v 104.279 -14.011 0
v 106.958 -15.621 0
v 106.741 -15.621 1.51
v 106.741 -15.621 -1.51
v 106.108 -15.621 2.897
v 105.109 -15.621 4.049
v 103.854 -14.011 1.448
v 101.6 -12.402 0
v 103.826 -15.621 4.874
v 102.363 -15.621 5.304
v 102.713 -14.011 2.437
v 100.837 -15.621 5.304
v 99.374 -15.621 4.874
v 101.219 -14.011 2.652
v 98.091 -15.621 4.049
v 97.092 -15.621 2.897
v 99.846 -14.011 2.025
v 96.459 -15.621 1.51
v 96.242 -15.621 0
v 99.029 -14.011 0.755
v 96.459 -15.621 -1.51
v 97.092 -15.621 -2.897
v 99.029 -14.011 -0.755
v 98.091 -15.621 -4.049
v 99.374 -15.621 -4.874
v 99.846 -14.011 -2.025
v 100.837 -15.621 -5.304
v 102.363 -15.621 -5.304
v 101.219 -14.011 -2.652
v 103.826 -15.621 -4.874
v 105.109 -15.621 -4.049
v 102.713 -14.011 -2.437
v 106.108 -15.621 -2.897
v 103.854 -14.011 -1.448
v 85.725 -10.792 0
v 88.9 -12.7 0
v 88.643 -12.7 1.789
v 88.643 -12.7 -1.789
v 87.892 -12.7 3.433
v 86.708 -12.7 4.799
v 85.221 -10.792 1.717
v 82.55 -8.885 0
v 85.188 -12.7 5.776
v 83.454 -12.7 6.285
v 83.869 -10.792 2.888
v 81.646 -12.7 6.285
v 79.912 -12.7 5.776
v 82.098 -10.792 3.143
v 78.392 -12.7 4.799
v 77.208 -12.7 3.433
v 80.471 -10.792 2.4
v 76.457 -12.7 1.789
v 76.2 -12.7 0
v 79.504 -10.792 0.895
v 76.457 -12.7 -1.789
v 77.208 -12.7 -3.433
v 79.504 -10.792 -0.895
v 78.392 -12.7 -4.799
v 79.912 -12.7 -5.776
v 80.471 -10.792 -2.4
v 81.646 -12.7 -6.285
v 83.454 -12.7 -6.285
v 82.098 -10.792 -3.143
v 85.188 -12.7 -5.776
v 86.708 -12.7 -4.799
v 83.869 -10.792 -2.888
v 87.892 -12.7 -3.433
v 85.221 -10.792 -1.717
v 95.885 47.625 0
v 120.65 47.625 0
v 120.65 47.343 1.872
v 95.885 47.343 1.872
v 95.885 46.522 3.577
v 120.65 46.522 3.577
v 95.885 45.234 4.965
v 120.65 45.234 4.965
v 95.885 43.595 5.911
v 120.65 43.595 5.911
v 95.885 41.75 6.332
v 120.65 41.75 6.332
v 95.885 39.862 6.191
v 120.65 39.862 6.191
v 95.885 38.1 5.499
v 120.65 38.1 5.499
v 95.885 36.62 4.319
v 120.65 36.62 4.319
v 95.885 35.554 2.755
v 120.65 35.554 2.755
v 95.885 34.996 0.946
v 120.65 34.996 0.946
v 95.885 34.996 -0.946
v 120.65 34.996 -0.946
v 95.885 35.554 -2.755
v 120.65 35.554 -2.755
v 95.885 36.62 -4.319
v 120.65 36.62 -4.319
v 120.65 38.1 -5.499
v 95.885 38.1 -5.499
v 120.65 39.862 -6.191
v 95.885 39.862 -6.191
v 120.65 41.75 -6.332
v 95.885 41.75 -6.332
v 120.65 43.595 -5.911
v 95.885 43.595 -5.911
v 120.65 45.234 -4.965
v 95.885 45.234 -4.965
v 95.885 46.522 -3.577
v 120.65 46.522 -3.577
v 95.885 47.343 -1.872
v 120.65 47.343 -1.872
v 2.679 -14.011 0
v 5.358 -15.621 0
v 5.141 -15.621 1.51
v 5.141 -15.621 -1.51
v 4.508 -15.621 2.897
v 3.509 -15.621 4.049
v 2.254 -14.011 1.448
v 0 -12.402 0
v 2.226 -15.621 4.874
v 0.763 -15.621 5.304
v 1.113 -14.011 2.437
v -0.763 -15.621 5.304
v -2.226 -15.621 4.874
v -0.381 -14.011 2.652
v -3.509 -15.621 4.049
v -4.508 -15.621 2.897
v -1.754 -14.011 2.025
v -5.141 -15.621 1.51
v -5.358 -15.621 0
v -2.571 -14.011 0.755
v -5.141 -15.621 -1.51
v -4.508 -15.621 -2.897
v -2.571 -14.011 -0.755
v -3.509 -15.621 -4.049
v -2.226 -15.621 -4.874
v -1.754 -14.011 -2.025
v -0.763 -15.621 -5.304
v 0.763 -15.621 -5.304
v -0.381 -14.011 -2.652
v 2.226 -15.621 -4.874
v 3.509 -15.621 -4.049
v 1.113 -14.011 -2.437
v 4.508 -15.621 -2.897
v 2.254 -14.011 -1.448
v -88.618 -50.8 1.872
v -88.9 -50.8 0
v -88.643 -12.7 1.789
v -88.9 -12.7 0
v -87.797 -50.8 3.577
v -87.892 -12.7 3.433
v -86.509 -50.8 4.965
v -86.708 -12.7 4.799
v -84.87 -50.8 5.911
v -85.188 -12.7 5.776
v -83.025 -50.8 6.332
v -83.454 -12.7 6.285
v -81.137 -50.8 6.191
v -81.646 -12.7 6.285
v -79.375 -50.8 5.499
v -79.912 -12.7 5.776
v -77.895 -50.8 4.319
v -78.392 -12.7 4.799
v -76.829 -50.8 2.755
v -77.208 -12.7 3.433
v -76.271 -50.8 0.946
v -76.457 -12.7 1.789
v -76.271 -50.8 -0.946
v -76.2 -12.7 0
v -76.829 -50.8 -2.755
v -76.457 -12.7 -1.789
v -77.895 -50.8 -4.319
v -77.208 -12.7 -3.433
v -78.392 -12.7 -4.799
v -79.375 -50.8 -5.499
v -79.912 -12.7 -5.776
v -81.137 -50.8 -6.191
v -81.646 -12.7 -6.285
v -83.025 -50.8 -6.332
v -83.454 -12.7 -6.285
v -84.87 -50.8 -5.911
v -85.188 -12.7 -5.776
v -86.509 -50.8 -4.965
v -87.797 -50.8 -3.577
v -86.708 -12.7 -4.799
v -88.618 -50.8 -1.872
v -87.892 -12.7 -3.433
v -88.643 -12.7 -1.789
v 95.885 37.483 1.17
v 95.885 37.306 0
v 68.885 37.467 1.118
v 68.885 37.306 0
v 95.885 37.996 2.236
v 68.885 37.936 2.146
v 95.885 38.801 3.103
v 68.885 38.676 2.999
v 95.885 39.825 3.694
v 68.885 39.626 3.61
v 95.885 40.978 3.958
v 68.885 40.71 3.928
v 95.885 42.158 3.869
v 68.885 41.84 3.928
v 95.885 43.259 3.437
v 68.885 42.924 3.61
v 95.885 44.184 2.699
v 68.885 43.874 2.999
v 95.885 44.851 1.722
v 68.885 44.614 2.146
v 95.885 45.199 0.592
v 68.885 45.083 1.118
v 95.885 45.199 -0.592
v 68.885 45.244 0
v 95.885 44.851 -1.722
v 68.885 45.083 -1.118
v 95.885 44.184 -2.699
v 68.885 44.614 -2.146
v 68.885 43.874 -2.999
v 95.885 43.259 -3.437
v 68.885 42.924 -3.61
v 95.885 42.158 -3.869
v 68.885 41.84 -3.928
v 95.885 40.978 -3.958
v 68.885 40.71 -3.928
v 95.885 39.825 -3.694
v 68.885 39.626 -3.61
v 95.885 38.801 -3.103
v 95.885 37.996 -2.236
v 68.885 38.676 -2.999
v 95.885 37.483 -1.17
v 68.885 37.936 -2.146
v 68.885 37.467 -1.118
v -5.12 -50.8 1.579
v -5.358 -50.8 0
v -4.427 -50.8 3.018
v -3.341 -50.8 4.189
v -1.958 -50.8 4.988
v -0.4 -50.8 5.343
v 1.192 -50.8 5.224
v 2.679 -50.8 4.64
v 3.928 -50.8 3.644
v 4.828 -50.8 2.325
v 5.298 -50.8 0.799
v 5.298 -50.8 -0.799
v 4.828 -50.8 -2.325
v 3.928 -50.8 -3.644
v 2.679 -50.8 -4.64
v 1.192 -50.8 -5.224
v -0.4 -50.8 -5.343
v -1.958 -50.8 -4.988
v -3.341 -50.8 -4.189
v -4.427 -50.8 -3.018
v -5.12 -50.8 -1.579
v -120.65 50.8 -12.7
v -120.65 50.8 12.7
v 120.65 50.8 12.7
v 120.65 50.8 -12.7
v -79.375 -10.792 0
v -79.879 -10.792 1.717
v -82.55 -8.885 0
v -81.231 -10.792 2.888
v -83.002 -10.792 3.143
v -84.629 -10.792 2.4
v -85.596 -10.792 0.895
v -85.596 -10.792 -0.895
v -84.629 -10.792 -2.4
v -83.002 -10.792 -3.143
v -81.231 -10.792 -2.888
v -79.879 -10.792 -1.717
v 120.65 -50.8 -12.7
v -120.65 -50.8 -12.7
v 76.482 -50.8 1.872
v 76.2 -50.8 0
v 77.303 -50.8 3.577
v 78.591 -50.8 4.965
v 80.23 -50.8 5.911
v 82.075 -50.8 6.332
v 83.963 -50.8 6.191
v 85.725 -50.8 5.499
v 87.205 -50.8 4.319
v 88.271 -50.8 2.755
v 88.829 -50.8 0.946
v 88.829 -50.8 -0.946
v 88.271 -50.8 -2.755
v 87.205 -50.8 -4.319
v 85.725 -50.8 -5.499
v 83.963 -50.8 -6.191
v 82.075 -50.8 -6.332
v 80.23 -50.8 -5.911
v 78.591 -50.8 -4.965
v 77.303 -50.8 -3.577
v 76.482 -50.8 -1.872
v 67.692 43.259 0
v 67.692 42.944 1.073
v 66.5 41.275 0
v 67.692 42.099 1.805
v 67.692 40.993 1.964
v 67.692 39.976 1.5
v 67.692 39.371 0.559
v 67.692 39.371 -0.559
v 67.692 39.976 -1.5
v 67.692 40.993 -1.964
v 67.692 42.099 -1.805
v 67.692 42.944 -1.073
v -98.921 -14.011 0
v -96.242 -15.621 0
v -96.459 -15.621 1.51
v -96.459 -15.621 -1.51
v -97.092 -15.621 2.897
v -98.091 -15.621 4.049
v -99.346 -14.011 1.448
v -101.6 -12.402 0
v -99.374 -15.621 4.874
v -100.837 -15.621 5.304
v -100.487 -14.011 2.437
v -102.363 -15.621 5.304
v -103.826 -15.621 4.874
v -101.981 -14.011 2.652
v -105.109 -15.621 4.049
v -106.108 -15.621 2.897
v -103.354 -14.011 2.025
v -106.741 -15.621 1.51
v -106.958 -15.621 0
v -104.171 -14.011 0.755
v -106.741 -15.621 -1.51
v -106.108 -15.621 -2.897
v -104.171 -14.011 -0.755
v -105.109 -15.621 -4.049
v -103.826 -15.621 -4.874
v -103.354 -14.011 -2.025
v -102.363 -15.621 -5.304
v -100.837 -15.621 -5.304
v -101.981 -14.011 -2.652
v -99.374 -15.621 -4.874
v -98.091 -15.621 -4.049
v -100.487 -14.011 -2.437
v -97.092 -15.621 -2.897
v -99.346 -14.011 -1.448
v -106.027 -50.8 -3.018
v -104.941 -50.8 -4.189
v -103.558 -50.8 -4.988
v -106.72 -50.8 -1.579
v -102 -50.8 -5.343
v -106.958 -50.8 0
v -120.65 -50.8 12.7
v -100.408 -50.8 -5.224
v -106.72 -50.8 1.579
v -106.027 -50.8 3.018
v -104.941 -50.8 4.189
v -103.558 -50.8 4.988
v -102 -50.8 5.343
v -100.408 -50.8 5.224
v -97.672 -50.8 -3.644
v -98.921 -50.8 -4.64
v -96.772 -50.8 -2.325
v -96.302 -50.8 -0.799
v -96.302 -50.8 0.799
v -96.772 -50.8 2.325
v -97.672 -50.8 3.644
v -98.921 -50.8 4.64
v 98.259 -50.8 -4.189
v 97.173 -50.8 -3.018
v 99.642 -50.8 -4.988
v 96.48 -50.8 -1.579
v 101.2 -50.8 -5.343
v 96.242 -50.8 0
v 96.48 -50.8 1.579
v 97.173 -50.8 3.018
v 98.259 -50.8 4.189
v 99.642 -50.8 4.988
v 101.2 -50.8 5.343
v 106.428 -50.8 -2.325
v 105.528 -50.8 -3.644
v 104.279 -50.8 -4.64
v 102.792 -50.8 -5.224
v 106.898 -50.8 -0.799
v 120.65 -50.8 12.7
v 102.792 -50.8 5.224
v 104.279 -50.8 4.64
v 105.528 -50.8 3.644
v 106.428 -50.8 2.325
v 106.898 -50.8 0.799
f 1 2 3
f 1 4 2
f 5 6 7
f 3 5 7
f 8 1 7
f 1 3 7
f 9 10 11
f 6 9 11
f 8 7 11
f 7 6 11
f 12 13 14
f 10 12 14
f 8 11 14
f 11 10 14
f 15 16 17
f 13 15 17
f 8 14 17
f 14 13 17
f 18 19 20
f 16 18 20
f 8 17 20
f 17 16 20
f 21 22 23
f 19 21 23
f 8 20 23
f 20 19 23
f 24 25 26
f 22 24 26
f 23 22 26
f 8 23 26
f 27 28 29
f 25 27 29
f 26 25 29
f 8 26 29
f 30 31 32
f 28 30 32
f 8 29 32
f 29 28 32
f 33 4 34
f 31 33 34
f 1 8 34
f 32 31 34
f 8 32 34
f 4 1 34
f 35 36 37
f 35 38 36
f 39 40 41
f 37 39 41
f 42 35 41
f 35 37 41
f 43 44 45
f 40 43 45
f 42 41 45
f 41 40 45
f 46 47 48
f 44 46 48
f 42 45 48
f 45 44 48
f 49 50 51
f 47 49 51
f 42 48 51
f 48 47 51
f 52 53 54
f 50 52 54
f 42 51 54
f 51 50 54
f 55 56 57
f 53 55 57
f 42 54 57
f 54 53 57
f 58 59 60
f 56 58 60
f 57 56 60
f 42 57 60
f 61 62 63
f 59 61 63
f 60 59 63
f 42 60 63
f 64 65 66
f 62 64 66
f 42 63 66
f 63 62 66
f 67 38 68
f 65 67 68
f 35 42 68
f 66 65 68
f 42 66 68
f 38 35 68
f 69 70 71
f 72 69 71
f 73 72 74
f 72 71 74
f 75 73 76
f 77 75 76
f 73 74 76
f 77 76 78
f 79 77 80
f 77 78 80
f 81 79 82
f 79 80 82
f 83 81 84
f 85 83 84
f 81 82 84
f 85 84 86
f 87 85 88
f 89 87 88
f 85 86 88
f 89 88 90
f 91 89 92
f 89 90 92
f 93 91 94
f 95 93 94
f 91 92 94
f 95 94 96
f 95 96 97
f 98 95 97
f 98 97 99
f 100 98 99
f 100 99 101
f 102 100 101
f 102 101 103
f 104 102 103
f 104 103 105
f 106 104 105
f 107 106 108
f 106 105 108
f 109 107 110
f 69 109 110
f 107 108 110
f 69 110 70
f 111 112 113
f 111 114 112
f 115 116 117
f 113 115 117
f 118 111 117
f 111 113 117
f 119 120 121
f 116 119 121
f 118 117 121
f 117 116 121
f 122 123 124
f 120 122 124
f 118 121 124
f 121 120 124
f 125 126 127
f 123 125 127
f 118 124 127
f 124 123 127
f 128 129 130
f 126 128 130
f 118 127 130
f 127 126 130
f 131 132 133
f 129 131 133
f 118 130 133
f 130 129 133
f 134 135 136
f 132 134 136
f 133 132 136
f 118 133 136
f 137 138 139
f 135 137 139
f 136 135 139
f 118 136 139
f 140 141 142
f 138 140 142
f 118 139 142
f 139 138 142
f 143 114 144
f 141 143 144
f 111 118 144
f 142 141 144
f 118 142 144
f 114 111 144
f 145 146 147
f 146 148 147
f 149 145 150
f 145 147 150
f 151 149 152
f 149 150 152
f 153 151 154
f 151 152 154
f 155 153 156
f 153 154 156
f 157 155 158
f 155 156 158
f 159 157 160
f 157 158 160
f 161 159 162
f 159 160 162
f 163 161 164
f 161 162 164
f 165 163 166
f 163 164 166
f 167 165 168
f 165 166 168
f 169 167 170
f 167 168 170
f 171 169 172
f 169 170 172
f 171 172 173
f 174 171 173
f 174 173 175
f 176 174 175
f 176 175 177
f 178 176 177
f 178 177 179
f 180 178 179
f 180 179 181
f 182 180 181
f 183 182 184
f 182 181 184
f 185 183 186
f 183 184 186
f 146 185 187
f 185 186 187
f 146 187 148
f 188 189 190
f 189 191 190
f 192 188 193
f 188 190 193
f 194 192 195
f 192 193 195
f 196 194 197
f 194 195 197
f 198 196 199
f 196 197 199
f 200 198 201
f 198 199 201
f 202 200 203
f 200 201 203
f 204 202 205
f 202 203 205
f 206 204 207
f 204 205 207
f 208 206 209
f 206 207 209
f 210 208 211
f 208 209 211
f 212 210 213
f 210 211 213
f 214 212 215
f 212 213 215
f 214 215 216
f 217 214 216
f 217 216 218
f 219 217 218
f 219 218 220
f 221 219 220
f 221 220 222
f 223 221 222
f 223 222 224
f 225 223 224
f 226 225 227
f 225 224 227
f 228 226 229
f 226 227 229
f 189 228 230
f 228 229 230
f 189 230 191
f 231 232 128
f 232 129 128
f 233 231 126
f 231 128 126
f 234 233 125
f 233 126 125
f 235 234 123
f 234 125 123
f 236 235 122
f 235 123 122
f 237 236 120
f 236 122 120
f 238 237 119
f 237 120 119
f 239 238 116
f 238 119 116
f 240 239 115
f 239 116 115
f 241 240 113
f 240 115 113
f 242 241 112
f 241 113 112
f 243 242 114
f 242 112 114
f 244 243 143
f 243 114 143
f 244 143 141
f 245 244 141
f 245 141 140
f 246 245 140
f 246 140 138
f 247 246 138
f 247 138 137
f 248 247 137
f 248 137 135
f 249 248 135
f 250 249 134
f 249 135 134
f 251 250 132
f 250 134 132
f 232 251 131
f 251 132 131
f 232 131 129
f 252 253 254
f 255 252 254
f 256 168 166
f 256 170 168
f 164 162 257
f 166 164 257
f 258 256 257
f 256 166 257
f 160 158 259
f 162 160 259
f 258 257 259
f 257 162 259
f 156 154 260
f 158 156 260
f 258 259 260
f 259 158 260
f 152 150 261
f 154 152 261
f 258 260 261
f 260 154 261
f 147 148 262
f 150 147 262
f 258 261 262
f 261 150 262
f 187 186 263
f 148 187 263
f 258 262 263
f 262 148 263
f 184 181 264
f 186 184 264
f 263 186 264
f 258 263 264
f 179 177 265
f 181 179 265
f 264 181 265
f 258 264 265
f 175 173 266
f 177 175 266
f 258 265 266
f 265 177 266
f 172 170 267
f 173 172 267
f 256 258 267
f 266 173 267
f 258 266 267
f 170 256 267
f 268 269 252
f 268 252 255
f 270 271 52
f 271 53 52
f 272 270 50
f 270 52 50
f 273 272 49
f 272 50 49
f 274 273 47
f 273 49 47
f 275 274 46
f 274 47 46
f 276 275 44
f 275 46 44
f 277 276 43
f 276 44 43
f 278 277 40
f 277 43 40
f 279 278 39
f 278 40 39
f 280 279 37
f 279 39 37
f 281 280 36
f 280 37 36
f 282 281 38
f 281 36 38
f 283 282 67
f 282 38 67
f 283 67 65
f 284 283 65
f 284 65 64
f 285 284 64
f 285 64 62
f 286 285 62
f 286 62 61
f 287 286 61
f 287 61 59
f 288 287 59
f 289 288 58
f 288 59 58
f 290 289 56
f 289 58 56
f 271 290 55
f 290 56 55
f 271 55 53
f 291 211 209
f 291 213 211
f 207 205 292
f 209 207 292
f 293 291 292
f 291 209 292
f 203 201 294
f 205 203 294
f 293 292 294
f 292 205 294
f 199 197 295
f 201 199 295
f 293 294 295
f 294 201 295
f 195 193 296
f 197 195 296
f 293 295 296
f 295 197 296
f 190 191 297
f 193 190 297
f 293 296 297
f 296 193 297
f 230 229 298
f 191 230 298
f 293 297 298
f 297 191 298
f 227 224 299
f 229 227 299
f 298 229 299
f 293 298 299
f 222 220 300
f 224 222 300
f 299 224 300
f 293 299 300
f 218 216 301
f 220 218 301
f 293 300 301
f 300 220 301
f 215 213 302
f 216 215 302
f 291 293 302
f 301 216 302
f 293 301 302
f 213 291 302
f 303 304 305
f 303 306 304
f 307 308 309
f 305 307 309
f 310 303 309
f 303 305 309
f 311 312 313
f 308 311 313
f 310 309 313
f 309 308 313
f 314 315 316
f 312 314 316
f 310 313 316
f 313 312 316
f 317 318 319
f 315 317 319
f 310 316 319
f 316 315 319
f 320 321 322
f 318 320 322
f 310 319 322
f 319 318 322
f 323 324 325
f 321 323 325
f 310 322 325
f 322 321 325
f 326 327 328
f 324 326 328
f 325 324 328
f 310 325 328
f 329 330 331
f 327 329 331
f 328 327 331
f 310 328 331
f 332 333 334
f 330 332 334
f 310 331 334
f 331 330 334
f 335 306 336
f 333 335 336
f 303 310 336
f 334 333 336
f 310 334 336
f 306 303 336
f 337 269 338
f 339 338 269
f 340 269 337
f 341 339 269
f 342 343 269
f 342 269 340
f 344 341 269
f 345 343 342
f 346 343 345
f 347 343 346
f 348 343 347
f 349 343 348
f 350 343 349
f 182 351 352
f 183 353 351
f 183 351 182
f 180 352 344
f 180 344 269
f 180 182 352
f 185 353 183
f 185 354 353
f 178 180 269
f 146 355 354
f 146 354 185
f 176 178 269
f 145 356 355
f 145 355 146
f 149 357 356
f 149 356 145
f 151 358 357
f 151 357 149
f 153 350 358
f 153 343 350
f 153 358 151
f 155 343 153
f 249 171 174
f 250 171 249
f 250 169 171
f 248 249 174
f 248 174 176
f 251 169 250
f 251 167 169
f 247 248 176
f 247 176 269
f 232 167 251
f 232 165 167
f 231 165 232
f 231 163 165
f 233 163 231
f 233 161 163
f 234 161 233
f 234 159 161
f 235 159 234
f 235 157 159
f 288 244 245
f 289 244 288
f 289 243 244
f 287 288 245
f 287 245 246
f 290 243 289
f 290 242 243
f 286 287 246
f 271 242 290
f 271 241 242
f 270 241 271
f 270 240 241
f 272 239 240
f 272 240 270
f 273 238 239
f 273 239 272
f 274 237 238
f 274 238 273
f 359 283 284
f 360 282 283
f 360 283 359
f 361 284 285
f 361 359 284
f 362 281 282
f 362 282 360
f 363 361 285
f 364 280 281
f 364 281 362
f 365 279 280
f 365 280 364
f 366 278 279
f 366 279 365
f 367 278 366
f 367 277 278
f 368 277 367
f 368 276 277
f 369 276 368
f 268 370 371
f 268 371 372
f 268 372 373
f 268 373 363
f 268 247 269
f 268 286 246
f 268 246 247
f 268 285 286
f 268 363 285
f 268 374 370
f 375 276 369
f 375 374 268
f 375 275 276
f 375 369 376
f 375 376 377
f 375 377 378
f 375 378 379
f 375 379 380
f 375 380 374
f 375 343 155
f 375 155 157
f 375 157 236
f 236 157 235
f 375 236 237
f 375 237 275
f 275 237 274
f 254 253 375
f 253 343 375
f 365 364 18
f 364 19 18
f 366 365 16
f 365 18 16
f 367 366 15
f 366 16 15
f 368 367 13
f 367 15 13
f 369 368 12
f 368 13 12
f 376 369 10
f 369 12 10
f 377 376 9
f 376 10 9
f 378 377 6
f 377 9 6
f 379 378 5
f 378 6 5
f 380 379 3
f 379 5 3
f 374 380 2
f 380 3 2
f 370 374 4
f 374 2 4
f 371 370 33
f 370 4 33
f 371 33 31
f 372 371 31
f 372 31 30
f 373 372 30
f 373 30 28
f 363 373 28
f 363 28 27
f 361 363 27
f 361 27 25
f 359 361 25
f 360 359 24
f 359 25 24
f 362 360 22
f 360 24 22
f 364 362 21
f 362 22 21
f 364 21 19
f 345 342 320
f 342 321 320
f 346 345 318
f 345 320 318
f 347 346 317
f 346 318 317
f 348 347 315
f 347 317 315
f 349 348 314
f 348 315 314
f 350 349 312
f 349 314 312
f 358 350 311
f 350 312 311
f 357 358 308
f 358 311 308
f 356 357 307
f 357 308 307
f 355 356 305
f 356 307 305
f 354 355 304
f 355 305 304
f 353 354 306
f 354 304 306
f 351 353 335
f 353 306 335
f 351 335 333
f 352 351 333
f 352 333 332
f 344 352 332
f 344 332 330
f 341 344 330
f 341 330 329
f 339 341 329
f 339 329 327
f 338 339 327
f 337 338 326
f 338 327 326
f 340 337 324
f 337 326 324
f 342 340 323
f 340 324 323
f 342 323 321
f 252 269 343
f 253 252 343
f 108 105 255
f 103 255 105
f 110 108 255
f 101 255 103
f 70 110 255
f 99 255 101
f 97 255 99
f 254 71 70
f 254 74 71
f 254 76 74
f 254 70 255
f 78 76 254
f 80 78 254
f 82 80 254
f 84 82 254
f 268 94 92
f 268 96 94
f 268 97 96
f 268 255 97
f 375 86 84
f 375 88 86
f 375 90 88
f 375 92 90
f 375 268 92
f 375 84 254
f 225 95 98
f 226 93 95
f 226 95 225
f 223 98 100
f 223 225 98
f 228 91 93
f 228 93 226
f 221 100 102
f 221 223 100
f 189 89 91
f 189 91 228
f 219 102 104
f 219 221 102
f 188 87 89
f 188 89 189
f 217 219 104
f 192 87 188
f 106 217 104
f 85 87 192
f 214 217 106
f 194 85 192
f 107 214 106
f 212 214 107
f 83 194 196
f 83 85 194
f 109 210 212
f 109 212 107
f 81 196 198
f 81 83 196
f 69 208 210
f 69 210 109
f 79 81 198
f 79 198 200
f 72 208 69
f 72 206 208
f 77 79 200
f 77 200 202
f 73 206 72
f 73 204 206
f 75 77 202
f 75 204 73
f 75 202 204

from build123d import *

# Parameters (mm, degrees)
F0_W     = 241.3
F0_H     = 25.4
F1_DEPTH = 50.8
F2_R     = 6.35
F3_DEPTH = 24.765
F5_D     = 7.9375
F5_DEPTH = 27.0002
F5_TIP   = 2.3846655818
F7_D     = 10.71626
F7_DEPTH = 35.179
F7_TIP   = 3.2194893086
F8_D     = 12.7
F8_DEPTH = 38.1
F8_TIP   = 3.8154649308


# Not quite as in the source:
# - a length typed as a fraction of an inch, garbled in the dataset ("3 / 203.2 mm" for 3/8 in), is restored


with BuildPart() as f1:
    # F0 (on Front) → F1 (new body, symmetric)
    with BuildSketch(Plane.XZ):
        Rectangle(F0_W, F0_H)
    extrude(amount=F1_DEPTH, both=True)

    # F2 (on face) → F3 (cut)
    with BuildSketch(Plane.YZ.offset(120.65)):
        with Locations((41.275, 0)):
            Circle(F2_R)
    extrude(amount=-F3_DEPTH, mode=Mode.SUBTRACT)

    # F5
    with Locations(Plane.YZ.offset(95.885)):
        with Locations((41.275, 0)):
            Hole(F5_D / 2, depth=F5_DEPTH)
            with Locations((0, 0, -(F5_DEPTH + F5_TIP / 2))):  # 118° drill point
                Cone(0, F5_D / 2, F5_TIP, mode=Mode.SUBTRACT)

    # F7
    with Locations(Plane.XZ.offset(50.8)):
        with Locations((-101.6, 0), (0, 0), (101.6, 0)):
            Hole(F7_D / 2, depth=F7_DEPTH)
            with Locations((0, 0, -(F7_DEPTH + F7_TIP / 2))):  # 118° drill point
                Cone(0, F7_D / 2, F7_TIP, mode=Mode.SUBTRACT)

    # F8
    with Locations(Plane.XZ.offset(50.8)):
        with Locations((-82.55, 0), (82.55, 0)):
            Hole(F8_D / 2, depth=F8_DEPTH)
            with Locations((0, 0, -(F8_DEPTH + F8_TIP / 2))):  # 118° drill point
                Cone(0, F8_D / 2, F8_TIP, mode=Mode.SUBTRACT)


solid = f1.part
